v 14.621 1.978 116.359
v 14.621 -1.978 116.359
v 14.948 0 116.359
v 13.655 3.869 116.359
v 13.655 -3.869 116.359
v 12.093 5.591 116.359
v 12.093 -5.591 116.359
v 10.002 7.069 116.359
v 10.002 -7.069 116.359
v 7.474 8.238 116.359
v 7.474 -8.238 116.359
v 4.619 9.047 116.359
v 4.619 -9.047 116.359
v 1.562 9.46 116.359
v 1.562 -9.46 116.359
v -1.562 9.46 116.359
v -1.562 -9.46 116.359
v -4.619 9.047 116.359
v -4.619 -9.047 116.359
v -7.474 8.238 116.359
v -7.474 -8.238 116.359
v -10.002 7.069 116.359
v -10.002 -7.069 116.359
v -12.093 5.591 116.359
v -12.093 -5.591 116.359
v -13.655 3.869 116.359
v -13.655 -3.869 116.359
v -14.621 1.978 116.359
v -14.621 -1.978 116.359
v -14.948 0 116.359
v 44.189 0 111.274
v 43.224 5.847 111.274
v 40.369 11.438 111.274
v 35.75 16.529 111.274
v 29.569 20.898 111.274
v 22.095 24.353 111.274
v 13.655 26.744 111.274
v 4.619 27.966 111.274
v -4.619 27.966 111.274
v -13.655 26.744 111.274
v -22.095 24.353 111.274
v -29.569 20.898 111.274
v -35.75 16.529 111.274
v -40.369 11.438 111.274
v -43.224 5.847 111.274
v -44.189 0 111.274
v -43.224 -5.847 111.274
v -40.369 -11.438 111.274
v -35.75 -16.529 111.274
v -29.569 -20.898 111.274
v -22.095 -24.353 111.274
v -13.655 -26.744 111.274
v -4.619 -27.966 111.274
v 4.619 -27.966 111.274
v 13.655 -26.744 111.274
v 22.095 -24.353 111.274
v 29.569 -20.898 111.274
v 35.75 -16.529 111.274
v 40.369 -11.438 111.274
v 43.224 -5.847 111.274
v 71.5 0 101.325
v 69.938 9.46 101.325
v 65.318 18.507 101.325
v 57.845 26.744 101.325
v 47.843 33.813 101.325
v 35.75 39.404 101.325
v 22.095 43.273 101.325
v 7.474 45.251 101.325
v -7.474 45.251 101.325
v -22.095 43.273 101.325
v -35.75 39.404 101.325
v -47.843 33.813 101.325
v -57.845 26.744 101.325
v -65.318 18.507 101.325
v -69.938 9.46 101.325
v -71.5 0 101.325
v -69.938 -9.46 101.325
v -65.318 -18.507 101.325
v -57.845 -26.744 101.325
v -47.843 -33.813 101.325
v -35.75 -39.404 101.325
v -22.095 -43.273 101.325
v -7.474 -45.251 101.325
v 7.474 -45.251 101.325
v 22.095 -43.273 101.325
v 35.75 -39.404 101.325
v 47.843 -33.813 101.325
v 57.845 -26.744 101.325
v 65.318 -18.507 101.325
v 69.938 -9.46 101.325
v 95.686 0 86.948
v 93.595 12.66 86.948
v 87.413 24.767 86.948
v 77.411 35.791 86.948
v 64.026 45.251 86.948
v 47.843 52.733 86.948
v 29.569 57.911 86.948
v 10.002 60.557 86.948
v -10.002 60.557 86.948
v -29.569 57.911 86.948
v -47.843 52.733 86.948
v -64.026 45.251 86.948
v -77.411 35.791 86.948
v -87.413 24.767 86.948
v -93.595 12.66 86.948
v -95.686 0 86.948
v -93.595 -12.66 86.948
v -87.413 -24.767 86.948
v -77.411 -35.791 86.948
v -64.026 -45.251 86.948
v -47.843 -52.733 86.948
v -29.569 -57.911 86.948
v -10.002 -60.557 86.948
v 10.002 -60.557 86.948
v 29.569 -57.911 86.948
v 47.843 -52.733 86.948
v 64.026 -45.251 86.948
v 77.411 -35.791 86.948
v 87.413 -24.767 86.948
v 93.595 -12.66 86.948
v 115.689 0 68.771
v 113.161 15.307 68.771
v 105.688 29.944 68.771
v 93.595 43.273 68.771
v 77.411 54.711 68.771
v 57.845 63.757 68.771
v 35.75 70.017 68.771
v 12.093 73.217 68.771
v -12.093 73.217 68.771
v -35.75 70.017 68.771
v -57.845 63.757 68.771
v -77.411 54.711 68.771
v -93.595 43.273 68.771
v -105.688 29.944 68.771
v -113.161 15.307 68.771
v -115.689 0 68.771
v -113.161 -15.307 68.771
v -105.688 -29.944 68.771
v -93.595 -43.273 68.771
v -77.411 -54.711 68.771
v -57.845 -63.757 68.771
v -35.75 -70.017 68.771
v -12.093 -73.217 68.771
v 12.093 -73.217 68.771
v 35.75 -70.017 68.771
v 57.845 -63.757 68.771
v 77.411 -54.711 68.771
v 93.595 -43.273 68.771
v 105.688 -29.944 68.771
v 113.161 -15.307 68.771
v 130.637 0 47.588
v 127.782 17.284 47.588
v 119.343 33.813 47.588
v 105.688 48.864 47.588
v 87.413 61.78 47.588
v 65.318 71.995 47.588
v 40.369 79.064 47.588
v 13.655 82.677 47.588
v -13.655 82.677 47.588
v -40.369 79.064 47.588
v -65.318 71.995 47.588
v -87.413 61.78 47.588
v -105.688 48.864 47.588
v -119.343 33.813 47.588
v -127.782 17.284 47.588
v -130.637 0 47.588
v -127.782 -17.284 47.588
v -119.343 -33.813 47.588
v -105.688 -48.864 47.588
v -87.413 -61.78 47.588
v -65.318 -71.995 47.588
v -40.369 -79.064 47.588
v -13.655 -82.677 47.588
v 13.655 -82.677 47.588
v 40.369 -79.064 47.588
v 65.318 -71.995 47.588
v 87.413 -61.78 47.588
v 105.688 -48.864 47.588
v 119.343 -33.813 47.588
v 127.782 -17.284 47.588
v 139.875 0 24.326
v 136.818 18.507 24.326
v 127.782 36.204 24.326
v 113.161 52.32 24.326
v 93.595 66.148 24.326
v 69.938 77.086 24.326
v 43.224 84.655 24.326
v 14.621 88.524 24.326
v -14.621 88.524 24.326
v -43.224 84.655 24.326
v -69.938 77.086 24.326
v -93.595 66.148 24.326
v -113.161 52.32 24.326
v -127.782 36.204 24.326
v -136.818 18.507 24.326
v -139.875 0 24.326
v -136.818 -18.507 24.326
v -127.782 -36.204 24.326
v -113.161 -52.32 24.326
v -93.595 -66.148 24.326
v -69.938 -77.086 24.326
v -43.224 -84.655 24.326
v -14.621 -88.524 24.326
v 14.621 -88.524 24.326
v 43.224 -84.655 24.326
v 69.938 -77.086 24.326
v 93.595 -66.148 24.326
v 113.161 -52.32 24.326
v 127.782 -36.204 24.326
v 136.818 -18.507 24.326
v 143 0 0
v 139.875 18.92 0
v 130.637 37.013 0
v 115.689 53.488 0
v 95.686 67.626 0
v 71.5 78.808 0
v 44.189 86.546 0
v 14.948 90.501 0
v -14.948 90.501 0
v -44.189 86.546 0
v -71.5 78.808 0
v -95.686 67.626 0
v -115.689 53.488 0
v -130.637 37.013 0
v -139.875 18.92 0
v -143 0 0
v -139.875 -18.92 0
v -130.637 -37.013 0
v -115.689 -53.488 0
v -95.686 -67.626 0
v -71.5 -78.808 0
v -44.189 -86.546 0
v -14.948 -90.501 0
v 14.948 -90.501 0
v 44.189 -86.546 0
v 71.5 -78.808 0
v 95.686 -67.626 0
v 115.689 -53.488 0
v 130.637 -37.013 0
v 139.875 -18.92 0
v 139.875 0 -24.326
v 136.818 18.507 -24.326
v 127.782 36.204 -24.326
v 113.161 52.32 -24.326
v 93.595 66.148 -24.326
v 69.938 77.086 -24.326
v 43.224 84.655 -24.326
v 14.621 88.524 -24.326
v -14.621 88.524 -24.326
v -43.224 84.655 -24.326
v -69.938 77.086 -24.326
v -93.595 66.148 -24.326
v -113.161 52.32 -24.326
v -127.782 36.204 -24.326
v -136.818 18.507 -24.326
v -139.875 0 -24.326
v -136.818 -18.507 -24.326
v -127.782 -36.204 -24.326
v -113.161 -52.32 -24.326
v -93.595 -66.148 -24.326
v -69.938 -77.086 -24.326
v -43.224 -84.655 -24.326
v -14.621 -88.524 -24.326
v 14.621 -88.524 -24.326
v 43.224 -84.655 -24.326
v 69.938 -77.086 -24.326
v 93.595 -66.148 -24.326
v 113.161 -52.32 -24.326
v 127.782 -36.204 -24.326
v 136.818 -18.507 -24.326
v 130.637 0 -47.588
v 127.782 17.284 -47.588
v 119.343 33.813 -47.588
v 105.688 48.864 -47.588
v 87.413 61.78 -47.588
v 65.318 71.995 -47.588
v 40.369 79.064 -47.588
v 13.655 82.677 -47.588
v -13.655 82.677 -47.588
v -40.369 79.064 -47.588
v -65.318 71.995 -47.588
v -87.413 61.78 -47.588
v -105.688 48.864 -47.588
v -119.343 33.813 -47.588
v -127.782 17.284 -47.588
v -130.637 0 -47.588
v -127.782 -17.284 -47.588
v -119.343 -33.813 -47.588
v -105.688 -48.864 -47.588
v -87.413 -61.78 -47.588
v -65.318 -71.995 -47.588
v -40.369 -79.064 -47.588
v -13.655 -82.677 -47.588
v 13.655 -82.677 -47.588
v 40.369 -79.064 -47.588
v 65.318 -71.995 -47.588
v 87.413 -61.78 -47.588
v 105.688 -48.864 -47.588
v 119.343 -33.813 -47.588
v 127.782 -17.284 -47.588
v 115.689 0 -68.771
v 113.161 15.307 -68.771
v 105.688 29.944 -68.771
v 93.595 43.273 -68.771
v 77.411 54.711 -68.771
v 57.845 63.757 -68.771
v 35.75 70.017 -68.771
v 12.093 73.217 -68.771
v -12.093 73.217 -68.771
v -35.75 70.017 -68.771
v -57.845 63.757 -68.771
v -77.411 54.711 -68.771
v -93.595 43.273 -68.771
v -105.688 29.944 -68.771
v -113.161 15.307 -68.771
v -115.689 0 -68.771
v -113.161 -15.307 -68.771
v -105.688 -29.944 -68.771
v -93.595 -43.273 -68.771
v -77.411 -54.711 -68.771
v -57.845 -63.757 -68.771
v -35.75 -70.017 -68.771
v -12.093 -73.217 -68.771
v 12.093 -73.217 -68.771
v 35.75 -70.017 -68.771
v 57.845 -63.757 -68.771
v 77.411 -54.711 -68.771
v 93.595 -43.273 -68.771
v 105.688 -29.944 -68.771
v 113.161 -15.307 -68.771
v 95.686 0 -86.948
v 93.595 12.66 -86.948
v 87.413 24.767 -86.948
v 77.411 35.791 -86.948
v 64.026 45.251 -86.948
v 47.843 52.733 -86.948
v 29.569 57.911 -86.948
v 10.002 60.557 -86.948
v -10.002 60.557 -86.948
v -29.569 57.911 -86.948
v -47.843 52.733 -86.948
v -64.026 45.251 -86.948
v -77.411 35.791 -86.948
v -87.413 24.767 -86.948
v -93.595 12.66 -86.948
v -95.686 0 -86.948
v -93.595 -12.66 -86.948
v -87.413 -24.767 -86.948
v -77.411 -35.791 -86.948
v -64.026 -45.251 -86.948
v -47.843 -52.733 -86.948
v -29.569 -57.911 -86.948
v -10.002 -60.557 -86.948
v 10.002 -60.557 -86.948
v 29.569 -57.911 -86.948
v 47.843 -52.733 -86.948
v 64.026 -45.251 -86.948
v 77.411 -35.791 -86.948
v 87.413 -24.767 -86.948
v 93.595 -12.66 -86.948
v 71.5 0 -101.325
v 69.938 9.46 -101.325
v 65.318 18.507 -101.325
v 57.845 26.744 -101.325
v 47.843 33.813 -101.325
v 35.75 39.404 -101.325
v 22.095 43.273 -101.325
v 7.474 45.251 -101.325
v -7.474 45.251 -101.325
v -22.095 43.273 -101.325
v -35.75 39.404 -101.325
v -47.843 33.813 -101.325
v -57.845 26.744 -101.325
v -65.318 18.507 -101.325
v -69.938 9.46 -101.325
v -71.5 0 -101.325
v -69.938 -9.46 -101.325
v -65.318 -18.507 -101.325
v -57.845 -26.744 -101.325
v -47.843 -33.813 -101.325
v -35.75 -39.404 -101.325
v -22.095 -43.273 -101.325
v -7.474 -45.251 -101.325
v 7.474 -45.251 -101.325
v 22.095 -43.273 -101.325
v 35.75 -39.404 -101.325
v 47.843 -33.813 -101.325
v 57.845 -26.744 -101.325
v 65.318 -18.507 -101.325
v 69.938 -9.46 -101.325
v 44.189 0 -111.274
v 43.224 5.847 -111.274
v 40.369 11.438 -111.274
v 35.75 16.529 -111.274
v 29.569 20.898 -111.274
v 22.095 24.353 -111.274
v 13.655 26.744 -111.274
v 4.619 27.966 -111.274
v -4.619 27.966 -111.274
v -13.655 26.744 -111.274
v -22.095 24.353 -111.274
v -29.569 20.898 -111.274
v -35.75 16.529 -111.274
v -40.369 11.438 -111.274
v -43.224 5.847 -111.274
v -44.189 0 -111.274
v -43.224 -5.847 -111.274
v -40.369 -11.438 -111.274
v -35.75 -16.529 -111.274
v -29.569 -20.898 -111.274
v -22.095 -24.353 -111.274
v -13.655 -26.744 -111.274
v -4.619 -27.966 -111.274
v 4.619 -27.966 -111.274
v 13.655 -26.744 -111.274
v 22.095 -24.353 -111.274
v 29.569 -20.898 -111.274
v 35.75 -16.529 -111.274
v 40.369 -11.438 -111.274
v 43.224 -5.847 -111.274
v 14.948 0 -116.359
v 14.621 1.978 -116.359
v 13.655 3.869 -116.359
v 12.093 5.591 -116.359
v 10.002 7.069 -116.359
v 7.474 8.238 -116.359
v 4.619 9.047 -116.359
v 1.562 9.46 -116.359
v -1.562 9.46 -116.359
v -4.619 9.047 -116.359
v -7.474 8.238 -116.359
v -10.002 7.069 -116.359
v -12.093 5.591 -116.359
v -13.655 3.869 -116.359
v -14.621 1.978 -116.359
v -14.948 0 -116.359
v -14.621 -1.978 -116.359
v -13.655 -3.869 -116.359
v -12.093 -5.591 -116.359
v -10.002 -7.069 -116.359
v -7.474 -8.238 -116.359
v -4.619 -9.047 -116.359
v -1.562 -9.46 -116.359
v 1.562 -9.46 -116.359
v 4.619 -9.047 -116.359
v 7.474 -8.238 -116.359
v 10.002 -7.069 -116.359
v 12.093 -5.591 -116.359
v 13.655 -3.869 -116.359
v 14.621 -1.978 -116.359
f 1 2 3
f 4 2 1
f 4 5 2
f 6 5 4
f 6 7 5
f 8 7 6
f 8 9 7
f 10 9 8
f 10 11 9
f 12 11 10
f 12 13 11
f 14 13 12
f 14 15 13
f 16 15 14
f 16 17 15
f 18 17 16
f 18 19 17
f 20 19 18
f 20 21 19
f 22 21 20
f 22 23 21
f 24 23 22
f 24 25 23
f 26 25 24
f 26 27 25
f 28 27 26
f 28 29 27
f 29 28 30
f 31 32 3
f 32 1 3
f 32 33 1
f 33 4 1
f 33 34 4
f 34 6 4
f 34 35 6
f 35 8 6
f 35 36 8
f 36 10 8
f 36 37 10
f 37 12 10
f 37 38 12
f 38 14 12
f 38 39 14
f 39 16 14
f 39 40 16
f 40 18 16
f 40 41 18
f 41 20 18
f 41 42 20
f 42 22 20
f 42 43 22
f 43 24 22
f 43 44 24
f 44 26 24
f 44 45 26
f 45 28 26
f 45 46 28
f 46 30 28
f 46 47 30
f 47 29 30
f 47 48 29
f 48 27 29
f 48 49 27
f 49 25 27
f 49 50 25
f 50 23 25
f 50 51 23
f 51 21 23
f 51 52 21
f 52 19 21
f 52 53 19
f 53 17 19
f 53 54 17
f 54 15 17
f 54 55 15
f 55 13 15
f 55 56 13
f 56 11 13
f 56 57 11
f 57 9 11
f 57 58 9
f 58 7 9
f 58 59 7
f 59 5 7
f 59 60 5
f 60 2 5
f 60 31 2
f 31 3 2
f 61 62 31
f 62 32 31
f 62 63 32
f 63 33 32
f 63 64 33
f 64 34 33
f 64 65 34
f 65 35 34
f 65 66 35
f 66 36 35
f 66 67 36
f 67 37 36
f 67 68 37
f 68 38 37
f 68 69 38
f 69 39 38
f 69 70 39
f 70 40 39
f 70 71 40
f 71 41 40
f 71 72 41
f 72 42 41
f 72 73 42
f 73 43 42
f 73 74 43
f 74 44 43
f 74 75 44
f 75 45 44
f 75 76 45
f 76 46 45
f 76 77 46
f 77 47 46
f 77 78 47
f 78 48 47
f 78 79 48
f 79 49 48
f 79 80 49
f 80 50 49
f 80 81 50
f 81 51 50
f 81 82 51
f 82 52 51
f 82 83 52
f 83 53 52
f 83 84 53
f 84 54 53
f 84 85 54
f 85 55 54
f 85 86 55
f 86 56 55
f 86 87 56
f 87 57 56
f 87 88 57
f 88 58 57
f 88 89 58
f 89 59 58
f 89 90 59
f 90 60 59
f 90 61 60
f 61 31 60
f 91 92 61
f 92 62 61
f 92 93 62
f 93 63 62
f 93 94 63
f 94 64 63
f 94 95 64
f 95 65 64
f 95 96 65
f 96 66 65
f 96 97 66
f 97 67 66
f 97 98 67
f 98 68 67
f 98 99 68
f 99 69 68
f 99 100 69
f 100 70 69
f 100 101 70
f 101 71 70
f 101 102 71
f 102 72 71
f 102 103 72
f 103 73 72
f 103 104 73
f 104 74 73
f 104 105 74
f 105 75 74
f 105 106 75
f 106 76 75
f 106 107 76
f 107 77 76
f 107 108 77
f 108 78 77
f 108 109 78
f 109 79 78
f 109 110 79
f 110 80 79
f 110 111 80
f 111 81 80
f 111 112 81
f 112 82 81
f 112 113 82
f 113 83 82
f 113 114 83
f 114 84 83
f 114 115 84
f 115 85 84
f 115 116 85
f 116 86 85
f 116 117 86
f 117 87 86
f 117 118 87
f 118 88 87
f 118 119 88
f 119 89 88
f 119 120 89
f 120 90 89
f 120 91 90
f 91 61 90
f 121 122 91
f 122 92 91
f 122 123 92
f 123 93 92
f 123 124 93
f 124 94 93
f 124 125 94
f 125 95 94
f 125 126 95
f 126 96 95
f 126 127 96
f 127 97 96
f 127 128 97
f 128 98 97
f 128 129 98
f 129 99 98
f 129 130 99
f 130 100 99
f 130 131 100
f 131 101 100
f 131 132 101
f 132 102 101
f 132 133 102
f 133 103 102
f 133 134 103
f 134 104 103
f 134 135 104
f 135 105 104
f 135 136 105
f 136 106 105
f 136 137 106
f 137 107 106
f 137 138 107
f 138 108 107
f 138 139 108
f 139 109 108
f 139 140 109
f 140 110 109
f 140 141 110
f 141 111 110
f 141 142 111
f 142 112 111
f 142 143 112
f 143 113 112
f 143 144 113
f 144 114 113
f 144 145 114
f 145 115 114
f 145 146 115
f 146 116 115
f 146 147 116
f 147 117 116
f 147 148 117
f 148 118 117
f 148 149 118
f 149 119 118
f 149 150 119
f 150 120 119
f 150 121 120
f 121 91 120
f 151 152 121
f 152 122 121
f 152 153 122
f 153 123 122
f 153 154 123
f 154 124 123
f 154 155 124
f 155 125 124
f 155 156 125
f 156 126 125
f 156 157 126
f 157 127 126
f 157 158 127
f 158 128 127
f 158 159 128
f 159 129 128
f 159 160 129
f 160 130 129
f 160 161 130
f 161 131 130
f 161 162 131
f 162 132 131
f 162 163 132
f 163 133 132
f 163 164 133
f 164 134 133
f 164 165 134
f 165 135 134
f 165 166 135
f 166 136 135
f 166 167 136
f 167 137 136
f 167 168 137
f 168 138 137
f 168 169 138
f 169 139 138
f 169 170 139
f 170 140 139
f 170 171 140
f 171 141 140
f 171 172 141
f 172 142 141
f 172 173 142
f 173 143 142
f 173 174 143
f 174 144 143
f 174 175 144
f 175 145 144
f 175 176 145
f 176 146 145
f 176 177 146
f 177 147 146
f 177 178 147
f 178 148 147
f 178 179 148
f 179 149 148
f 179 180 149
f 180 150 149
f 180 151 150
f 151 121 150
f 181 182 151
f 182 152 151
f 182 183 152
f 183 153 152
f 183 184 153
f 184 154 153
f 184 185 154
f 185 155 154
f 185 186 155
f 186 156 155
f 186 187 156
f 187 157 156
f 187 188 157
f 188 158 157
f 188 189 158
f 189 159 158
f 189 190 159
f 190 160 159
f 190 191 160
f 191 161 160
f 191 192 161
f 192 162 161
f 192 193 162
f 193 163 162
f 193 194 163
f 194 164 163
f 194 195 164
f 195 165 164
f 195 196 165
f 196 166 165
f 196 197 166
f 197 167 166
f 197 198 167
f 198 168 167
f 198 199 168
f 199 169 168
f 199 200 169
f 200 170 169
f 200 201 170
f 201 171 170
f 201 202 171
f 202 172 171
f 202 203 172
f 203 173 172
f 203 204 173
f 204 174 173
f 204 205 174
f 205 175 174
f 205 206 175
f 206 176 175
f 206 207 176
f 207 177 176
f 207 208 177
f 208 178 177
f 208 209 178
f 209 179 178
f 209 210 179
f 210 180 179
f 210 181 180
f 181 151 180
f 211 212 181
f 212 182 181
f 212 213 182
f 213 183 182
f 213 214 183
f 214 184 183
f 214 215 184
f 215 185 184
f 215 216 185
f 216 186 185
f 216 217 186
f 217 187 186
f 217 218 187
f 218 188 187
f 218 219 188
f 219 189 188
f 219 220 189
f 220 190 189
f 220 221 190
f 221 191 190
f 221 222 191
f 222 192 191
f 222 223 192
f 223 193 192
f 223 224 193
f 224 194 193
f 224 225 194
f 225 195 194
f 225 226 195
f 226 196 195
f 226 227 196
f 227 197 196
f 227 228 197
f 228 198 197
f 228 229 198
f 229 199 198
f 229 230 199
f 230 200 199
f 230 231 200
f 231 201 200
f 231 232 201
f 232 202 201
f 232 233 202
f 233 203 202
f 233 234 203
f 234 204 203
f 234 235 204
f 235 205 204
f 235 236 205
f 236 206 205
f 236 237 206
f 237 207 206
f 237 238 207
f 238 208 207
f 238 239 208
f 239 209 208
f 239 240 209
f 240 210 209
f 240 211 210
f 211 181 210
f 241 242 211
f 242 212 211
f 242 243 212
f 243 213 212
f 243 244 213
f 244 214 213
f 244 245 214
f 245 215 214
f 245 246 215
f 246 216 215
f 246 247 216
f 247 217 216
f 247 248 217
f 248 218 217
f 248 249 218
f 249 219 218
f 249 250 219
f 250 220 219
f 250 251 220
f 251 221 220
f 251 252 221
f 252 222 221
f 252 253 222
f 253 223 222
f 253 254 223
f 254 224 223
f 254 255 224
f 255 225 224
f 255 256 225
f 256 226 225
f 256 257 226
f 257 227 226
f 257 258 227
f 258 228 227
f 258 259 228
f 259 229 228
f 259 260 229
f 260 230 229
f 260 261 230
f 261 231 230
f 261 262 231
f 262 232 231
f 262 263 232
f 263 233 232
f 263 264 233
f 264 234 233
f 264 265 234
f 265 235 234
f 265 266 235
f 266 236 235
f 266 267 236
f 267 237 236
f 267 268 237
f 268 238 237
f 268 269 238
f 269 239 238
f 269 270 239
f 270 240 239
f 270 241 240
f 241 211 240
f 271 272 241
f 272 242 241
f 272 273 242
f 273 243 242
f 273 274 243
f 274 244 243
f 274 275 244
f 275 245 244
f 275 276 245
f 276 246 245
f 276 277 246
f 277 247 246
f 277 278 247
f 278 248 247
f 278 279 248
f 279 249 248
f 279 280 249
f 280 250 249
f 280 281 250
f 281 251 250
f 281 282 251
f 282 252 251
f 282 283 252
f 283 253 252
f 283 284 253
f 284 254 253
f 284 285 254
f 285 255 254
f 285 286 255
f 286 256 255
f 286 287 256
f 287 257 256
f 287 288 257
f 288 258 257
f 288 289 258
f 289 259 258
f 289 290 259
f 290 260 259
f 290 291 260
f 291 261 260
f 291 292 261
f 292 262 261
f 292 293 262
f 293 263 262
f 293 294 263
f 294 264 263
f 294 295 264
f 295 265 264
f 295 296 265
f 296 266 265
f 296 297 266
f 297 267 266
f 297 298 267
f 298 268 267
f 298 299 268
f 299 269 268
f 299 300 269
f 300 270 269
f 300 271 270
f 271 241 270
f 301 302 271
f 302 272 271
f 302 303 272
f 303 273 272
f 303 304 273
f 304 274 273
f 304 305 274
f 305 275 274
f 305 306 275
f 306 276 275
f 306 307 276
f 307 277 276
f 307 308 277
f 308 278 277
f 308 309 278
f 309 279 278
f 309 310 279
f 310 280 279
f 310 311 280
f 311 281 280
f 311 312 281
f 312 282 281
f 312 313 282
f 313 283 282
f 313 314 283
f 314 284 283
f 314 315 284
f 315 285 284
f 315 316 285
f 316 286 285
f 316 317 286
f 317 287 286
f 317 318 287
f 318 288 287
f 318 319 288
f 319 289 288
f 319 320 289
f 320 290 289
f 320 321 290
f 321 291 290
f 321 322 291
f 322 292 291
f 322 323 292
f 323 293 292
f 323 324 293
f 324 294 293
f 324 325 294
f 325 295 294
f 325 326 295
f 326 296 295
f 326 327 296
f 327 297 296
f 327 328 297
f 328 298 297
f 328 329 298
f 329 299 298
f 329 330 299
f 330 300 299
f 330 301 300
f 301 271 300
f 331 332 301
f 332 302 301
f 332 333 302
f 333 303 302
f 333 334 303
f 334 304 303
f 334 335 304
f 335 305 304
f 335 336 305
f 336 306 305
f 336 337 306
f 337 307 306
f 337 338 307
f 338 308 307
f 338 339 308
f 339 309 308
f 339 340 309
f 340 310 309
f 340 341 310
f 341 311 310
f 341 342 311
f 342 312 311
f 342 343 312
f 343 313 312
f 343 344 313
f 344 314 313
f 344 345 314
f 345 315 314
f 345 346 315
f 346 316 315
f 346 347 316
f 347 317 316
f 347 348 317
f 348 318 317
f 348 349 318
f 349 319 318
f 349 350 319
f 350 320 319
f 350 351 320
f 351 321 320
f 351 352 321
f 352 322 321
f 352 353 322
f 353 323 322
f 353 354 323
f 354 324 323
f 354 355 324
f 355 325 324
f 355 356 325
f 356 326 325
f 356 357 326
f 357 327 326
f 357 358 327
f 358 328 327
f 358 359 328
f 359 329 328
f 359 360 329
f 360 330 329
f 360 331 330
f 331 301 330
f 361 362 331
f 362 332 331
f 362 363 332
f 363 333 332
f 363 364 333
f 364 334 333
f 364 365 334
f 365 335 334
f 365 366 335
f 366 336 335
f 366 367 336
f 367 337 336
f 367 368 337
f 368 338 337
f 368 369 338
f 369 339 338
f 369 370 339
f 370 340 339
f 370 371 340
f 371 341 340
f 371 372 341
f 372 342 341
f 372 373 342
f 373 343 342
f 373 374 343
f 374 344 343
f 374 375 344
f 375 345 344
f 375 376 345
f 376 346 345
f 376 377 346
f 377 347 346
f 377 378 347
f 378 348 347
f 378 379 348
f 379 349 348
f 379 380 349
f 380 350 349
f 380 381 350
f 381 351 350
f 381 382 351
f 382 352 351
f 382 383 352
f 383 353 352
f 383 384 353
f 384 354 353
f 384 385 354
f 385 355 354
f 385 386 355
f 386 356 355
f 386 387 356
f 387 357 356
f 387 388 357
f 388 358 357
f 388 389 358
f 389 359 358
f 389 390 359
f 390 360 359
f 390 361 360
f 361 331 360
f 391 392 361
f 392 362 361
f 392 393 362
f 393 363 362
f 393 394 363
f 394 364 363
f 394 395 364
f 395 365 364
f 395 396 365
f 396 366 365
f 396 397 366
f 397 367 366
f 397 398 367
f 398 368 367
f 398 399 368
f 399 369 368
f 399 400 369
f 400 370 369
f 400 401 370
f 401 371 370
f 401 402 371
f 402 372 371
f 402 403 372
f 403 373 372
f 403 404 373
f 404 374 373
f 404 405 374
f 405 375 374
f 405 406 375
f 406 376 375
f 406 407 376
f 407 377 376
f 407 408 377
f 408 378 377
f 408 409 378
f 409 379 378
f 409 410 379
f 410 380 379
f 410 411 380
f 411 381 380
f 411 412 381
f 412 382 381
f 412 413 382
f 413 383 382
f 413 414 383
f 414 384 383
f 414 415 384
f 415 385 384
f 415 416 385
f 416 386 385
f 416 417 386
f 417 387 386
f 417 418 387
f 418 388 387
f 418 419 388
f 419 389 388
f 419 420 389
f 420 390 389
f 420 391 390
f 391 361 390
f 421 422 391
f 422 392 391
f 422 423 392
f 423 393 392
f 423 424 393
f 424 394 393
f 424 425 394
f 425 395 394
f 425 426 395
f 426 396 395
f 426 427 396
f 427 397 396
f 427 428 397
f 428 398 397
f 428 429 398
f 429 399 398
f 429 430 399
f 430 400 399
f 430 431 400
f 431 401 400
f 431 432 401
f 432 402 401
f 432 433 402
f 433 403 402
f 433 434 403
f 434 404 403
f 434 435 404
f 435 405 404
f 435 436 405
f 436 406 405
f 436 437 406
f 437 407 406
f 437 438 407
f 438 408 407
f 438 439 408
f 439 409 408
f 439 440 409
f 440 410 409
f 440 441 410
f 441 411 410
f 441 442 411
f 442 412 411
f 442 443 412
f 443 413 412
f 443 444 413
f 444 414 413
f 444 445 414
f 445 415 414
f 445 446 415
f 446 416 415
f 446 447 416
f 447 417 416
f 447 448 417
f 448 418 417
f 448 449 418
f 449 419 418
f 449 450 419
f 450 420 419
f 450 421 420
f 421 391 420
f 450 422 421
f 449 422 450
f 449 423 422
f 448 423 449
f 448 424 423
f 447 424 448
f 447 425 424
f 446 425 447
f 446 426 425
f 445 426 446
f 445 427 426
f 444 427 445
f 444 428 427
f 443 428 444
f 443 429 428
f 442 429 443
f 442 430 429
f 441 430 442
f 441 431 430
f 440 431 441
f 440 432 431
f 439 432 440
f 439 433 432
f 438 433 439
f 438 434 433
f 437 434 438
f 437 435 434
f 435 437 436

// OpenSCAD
// Generated by SolidPython 1.0.1 on 2020-07-29 00:46:49


scale(v = [11, 7, 9]) {
	sphere(r = 13);
}
/***********************************************
*********      SolidPython code:      **********
************************************************
 
# import packages: SolidPython
from solid import *
from solid.utils import *
from itertools import chain, combinations, permutations


class Resize:

    def __init__(self, scad_file):
        self.scad_file = scad_file
        #self.scad_file = import_scad(scad_file)
        # cone/cylinder param:
        self.r1 = 0
        self.r2 = 0
        self.h = 0
        # rectangular prism param:
        self.w = 0
        self.l = 0
        # ellipse param:
        self.r = 0

    # import OpenScad code (file name corresponds to shape)


    # classify shape + parameters
    def assign(self, param1, param2, param3):
        if self.scad_file == 'cone.scad':
            self.r1 = param1
            self.r2 = param2
            self.h = param3
        elif self.scad_file == 'cylinder.scad':
            self.r1 = param1
            self.r2 = param2
            self.h = param3
        elif self.scad_file == 'rectangularPrism.scad':
            self.h = param1
            self.l = param2
            self.w = param3
        else:
            self.r = param1
            self.h = param2

    # resize parameters
    def iterate(self):
        x = range(3, 20, 2)
        i = 1
        if self.scad_file == 'cone.scad':
            tempList = list(permutations(x, 2))
            for temp in tempList:
                param1 = temp[0]
                param2 = temp[1]
                filepath = 'produced_scad_files/' + 'cone' + str(param1) + '_' + str(param2) + '_' + '.scad'
                scad_render_to_file(cylinder(h=param1, r1=param2, r2=0), filepath)

        elif self.scad_file == 'cylinder.scad':
            tempList = list(permutations(x, 3))
            for temp in tempList:
                param1 = temp[0]
                param2 = temp[1]
                filepath = 'produced_scad_files/' + 'cylinder' + str(param1) + '_' + str(param2) + '_' + '.scad'
                scad_render_to_file(cylinder(h=param1, r1=param2, r2=param2), filepath)

        elif self.scad_file == 'rectangularPrism.scad':
            tempList = list(permutations(x, 3))
            for temp in tempList:
                param1 = temp[0]
                param2 = temp[1]
                param3 = temp[2]
                filepath = 'produced_scad_files/' + 'rectangularPrism' + str(param1) + '_' + str(param2) + '_' + str(
                    param3) + '.scad'
                scad_render_to_file(cube(size=(param1, param2, param3)), filepath)

        elif self.scad_file == 'ellipse.scad':
            tempList = list(permutations(x, 4))
            for temp in tempList:
                param1 = temp[0]
                param2 = temp[1]
                param3 = temp[2]
                param4 = temp[3]
                filepath = 'produced_scad_files/' + 'ellipse' + str(param1) + '_' + str(param2) + '_' + str(param3) + '_' + str(param4) + '.scad'
                scad_render_to_file(scale([param1, param2, param3])(sphere(r=param4)), filepath)

    def render_to_scadfile(self):
        scad_render_to_file(scad, 'example.scad') 
 
************************************************/
